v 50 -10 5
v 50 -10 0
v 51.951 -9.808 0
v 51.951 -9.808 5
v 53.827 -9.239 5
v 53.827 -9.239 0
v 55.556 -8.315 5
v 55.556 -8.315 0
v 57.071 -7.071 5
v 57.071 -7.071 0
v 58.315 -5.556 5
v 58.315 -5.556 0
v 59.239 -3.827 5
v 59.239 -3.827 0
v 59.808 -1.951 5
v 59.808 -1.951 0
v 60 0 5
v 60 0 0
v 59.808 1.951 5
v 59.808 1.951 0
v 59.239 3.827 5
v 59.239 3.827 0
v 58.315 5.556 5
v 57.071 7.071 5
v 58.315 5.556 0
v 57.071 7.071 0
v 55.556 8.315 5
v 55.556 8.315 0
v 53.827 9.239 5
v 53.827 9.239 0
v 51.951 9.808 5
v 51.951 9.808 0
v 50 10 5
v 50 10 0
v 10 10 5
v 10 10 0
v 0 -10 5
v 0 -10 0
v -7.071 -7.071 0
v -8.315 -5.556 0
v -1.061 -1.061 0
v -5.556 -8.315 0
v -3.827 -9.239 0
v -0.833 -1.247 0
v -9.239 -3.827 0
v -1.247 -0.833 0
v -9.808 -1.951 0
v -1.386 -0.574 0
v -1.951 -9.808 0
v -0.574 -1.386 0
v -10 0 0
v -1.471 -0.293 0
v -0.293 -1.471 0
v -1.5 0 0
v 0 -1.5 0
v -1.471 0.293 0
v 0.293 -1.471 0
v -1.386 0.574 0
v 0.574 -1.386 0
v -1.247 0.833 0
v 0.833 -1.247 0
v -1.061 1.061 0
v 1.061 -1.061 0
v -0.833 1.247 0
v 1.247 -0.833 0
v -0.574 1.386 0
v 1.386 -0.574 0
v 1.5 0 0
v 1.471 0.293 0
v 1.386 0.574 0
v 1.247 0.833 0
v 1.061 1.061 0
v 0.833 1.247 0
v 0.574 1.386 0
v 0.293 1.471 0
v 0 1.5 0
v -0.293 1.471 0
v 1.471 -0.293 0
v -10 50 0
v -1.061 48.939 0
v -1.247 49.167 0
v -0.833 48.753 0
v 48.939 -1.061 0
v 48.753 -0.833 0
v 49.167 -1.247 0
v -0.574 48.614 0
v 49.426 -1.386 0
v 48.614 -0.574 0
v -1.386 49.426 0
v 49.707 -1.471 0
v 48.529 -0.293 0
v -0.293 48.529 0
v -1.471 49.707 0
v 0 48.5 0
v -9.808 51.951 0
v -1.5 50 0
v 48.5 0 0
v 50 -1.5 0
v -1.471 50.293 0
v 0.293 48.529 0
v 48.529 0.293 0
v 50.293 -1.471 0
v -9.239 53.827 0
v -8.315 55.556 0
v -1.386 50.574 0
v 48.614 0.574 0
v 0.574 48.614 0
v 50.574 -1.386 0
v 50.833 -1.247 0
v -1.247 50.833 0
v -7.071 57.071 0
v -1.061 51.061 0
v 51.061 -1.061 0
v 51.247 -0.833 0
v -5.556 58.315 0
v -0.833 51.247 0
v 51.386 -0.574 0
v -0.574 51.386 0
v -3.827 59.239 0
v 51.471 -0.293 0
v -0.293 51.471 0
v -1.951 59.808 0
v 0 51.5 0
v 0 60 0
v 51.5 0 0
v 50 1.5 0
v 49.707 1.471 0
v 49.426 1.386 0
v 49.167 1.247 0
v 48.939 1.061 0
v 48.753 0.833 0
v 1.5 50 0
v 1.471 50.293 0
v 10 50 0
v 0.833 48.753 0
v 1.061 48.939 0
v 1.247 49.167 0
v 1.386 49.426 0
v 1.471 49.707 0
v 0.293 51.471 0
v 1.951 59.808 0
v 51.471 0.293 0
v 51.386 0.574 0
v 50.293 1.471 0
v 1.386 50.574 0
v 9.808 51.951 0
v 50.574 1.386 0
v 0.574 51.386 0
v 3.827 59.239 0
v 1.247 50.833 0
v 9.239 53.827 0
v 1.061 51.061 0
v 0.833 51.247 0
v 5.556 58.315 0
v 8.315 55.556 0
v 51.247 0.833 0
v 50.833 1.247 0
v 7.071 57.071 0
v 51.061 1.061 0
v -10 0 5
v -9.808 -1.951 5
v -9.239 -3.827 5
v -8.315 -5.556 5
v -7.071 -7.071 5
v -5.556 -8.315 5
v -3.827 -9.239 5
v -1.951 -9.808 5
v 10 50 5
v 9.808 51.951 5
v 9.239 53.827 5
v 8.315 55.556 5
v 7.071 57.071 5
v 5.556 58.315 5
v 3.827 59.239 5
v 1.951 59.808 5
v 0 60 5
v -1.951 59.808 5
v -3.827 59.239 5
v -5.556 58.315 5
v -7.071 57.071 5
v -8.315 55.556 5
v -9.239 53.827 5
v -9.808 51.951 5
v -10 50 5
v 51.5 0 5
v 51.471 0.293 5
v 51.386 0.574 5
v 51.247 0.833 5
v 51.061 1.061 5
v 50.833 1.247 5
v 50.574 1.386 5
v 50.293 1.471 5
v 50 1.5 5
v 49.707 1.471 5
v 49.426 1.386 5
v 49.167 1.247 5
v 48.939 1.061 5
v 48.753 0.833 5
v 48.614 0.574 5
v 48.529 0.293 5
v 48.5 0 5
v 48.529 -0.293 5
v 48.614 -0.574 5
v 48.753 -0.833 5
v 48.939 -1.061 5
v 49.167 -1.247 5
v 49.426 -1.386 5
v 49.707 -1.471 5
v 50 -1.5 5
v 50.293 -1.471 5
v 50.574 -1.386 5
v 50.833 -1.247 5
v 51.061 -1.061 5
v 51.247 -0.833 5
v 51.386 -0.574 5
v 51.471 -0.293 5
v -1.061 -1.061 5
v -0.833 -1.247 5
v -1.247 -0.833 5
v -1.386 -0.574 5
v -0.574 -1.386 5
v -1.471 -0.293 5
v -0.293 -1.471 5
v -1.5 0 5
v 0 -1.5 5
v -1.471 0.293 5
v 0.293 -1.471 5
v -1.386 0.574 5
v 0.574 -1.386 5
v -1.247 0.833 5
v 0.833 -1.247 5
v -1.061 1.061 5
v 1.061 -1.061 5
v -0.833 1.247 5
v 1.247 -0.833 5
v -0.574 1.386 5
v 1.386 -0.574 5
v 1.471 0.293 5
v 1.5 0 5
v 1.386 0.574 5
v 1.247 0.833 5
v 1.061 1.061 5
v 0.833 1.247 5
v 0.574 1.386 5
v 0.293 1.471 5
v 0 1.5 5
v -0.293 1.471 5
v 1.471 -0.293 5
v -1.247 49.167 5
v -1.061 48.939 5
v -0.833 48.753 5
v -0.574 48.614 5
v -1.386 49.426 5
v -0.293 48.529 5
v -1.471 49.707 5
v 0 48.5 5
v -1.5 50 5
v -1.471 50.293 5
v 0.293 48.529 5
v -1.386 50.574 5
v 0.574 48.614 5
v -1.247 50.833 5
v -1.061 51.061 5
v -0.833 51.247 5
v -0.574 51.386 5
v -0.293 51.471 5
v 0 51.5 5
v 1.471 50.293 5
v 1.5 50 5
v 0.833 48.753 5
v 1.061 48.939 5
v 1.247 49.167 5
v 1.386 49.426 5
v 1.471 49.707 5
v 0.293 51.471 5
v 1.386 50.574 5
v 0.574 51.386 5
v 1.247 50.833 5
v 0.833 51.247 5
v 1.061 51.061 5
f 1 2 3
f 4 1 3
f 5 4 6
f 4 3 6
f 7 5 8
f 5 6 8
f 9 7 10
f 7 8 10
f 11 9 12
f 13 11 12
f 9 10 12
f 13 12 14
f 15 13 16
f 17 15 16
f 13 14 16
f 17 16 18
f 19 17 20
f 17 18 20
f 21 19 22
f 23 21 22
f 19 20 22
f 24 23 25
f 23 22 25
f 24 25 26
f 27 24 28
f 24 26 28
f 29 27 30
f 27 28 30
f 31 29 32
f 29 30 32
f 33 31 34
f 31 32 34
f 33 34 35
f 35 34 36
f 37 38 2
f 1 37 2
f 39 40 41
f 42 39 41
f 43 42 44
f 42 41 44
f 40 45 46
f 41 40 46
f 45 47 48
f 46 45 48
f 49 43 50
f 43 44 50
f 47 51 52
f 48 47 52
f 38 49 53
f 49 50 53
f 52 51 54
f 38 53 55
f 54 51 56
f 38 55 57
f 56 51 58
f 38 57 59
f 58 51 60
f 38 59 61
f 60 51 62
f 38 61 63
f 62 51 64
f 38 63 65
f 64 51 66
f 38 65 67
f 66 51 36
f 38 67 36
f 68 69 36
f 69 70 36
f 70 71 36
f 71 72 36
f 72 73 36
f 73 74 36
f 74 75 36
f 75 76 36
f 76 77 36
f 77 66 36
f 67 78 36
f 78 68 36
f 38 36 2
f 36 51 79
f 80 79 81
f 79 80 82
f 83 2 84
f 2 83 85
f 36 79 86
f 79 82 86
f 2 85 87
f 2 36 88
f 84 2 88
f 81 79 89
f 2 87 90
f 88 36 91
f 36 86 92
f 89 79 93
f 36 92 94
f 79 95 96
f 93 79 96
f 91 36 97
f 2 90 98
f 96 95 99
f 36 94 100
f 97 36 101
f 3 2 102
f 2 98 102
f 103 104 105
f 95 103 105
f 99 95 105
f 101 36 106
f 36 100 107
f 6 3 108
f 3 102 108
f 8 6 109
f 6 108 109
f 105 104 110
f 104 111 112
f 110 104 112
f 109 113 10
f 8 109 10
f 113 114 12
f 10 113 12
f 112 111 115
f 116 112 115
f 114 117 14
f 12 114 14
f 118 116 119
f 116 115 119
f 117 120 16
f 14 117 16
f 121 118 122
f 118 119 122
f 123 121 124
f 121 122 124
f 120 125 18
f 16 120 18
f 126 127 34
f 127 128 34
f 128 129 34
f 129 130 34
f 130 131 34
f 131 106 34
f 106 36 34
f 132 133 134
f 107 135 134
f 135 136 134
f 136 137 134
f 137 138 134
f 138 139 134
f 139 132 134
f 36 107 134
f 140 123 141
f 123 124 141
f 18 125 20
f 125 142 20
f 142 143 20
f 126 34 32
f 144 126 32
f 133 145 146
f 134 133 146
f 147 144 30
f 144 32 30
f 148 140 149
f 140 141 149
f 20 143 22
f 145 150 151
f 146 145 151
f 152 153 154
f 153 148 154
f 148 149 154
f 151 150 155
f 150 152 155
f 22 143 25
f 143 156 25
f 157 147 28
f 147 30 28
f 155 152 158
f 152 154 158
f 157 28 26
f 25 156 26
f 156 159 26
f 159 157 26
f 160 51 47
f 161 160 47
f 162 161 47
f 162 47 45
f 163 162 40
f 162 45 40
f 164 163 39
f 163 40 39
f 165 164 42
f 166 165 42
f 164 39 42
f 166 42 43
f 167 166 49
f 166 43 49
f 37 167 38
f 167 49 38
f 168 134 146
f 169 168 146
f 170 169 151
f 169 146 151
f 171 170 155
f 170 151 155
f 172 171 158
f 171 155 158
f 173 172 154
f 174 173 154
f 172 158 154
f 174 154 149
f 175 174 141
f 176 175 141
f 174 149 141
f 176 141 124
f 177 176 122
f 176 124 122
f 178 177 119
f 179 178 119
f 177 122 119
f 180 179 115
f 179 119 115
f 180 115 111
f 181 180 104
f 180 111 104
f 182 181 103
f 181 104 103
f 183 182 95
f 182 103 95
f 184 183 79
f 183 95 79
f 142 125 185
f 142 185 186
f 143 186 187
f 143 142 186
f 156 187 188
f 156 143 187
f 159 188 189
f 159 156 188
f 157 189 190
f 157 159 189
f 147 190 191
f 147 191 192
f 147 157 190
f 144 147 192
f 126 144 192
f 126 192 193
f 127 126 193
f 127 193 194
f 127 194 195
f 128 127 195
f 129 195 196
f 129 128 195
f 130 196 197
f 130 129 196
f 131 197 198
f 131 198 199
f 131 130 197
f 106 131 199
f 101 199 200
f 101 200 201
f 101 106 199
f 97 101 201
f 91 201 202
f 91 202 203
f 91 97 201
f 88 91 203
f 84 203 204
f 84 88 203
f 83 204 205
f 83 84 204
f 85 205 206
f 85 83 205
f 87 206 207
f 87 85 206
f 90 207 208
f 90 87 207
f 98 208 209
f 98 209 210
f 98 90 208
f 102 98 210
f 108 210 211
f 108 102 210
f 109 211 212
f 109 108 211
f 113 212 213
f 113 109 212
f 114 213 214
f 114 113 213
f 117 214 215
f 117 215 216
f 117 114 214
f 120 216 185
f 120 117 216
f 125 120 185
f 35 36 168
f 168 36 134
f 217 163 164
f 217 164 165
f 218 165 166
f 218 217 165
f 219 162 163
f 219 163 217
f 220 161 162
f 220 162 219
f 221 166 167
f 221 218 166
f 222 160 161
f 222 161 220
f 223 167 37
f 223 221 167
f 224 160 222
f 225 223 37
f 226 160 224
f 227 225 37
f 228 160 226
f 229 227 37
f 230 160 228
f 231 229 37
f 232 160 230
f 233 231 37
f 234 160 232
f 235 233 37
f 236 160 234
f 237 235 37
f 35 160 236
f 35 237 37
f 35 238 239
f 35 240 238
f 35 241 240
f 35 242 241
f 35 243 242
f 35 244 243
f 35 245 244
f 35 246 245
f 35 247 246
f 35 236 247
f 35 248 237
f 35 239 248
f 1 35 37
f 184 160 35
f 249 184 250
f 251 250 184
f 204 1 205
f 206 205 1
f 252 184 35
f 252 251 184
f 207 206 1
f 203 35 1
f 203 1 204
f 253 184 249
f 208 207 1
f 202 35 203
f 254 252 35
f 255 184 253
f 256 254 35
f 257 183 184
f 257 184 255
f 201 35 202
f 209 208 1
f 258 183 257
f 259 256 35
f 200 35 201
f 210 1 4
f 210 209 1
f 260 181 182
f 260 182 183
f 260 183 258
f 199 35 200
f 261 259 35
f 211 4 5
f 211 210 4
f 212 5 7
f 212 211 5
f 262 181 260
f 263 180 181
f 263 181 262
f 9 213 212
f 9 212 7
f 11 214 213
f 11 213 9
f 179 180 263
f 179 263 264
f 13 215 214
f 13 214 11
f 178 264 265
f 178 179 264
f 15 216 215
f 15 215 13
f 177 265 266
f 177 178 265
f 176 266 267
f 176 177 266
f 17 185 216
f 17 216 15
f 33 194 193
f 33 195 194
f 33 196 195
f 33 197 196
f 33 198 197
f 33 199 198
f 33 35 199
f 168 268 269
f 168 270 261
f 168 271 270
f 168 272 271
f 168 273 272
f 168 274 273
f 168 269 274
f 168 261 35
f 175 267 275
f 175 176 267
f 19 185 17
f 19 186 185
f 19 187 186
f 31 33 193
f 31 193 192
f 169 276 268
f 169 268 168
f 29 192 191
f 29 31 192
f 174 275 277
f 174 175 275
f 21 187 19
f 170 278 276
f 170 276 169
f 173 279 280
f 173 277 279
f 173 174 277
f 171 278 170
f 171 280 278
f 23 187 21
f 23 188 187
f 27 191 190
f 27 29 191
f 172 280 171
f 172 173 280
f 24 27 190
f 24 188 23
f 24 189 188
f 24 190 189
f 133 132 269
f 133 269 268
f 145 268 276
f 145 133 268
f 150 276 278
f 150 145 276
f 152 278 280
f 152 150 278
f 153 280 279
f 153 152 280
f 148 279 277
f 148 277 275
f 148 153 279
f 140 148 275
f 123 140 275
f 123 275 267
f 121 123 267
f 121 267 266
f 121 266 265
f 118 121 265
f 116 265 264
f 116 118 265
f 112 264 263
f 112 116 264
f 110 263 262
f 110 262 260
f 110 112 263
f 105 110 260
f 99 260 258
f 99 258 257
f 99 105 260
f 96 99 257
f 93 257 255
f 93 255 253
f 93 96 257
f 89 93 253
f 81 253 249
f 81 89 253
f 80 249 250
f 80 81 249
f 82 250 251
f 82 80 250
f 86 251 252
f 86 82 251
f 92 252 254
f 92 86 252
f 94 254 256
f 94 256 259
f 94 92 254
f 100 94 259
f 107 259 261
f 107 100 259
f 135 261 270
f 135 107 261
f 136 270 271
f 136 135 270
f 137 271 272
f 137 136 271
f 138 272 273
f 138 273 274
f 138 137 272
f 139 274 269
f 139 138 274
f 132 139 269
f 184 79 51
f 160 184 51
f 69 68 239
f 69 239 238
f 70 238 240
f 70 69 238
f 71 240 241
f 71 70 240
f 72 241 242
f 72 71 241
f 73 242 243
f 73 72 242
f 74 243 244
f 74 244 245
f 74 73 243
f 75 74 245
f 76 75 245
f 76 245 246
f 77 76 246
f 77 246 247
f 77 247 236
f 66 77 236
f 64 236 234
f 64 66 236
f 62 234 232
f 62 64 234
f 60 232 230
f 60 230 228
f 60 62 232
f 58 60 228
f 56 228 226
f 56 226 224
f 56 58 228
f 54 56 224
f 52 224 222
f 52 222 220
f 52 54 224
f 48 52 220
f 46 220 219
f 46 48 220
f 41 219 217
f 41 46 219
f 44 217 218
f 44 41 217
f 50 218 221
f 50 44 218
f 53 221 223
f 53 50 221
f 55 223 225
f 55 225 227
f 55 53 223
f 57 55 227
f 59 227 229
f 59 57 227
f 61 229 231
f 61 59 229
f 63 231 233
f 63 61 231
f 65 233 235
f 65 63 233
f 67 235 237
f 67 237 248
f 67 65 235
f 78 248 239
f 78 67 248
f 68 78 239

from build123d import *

# Parameters (mm, degrees)
SKETCH2_R           = 1.5
BOSS_EXTRUDE1_DEPTH = 5


with BuildPart() as part:
    # Sketch2 → Boss-Extrude1 (new body)
    with BuildSketch(Plane.XY):
        with BuildLine():
            Line((-10, 50), (-10, 0))
            ThreePointArc((-10, 0), (-7.071067812, -7.071067812), (0, -10))
            Line((0, -10), (50, -10))
            ThreePointArc((50, -10), (60, 0), (50, 10))
            Line((50, 10), (10, 10))
            Line((10, 10), (10, 50))
            ThreePointArc((10, 50), (0, 60), (-10, 50))
        make_face()
        Circle(SKETCH2_R, mode=Mode.SUBTRACT)
        with Locations((0, 50)):
            Circle(SKETCH2_R, mode=Mode.SUBTRACT)
        with Locations((50, 0)):
            Circle(SKETCH2_R, mode=Mode.SUBTRACT)
    extrude(amount=BOSS_EXTRUDE1_DEPTH)


solid = part.part
